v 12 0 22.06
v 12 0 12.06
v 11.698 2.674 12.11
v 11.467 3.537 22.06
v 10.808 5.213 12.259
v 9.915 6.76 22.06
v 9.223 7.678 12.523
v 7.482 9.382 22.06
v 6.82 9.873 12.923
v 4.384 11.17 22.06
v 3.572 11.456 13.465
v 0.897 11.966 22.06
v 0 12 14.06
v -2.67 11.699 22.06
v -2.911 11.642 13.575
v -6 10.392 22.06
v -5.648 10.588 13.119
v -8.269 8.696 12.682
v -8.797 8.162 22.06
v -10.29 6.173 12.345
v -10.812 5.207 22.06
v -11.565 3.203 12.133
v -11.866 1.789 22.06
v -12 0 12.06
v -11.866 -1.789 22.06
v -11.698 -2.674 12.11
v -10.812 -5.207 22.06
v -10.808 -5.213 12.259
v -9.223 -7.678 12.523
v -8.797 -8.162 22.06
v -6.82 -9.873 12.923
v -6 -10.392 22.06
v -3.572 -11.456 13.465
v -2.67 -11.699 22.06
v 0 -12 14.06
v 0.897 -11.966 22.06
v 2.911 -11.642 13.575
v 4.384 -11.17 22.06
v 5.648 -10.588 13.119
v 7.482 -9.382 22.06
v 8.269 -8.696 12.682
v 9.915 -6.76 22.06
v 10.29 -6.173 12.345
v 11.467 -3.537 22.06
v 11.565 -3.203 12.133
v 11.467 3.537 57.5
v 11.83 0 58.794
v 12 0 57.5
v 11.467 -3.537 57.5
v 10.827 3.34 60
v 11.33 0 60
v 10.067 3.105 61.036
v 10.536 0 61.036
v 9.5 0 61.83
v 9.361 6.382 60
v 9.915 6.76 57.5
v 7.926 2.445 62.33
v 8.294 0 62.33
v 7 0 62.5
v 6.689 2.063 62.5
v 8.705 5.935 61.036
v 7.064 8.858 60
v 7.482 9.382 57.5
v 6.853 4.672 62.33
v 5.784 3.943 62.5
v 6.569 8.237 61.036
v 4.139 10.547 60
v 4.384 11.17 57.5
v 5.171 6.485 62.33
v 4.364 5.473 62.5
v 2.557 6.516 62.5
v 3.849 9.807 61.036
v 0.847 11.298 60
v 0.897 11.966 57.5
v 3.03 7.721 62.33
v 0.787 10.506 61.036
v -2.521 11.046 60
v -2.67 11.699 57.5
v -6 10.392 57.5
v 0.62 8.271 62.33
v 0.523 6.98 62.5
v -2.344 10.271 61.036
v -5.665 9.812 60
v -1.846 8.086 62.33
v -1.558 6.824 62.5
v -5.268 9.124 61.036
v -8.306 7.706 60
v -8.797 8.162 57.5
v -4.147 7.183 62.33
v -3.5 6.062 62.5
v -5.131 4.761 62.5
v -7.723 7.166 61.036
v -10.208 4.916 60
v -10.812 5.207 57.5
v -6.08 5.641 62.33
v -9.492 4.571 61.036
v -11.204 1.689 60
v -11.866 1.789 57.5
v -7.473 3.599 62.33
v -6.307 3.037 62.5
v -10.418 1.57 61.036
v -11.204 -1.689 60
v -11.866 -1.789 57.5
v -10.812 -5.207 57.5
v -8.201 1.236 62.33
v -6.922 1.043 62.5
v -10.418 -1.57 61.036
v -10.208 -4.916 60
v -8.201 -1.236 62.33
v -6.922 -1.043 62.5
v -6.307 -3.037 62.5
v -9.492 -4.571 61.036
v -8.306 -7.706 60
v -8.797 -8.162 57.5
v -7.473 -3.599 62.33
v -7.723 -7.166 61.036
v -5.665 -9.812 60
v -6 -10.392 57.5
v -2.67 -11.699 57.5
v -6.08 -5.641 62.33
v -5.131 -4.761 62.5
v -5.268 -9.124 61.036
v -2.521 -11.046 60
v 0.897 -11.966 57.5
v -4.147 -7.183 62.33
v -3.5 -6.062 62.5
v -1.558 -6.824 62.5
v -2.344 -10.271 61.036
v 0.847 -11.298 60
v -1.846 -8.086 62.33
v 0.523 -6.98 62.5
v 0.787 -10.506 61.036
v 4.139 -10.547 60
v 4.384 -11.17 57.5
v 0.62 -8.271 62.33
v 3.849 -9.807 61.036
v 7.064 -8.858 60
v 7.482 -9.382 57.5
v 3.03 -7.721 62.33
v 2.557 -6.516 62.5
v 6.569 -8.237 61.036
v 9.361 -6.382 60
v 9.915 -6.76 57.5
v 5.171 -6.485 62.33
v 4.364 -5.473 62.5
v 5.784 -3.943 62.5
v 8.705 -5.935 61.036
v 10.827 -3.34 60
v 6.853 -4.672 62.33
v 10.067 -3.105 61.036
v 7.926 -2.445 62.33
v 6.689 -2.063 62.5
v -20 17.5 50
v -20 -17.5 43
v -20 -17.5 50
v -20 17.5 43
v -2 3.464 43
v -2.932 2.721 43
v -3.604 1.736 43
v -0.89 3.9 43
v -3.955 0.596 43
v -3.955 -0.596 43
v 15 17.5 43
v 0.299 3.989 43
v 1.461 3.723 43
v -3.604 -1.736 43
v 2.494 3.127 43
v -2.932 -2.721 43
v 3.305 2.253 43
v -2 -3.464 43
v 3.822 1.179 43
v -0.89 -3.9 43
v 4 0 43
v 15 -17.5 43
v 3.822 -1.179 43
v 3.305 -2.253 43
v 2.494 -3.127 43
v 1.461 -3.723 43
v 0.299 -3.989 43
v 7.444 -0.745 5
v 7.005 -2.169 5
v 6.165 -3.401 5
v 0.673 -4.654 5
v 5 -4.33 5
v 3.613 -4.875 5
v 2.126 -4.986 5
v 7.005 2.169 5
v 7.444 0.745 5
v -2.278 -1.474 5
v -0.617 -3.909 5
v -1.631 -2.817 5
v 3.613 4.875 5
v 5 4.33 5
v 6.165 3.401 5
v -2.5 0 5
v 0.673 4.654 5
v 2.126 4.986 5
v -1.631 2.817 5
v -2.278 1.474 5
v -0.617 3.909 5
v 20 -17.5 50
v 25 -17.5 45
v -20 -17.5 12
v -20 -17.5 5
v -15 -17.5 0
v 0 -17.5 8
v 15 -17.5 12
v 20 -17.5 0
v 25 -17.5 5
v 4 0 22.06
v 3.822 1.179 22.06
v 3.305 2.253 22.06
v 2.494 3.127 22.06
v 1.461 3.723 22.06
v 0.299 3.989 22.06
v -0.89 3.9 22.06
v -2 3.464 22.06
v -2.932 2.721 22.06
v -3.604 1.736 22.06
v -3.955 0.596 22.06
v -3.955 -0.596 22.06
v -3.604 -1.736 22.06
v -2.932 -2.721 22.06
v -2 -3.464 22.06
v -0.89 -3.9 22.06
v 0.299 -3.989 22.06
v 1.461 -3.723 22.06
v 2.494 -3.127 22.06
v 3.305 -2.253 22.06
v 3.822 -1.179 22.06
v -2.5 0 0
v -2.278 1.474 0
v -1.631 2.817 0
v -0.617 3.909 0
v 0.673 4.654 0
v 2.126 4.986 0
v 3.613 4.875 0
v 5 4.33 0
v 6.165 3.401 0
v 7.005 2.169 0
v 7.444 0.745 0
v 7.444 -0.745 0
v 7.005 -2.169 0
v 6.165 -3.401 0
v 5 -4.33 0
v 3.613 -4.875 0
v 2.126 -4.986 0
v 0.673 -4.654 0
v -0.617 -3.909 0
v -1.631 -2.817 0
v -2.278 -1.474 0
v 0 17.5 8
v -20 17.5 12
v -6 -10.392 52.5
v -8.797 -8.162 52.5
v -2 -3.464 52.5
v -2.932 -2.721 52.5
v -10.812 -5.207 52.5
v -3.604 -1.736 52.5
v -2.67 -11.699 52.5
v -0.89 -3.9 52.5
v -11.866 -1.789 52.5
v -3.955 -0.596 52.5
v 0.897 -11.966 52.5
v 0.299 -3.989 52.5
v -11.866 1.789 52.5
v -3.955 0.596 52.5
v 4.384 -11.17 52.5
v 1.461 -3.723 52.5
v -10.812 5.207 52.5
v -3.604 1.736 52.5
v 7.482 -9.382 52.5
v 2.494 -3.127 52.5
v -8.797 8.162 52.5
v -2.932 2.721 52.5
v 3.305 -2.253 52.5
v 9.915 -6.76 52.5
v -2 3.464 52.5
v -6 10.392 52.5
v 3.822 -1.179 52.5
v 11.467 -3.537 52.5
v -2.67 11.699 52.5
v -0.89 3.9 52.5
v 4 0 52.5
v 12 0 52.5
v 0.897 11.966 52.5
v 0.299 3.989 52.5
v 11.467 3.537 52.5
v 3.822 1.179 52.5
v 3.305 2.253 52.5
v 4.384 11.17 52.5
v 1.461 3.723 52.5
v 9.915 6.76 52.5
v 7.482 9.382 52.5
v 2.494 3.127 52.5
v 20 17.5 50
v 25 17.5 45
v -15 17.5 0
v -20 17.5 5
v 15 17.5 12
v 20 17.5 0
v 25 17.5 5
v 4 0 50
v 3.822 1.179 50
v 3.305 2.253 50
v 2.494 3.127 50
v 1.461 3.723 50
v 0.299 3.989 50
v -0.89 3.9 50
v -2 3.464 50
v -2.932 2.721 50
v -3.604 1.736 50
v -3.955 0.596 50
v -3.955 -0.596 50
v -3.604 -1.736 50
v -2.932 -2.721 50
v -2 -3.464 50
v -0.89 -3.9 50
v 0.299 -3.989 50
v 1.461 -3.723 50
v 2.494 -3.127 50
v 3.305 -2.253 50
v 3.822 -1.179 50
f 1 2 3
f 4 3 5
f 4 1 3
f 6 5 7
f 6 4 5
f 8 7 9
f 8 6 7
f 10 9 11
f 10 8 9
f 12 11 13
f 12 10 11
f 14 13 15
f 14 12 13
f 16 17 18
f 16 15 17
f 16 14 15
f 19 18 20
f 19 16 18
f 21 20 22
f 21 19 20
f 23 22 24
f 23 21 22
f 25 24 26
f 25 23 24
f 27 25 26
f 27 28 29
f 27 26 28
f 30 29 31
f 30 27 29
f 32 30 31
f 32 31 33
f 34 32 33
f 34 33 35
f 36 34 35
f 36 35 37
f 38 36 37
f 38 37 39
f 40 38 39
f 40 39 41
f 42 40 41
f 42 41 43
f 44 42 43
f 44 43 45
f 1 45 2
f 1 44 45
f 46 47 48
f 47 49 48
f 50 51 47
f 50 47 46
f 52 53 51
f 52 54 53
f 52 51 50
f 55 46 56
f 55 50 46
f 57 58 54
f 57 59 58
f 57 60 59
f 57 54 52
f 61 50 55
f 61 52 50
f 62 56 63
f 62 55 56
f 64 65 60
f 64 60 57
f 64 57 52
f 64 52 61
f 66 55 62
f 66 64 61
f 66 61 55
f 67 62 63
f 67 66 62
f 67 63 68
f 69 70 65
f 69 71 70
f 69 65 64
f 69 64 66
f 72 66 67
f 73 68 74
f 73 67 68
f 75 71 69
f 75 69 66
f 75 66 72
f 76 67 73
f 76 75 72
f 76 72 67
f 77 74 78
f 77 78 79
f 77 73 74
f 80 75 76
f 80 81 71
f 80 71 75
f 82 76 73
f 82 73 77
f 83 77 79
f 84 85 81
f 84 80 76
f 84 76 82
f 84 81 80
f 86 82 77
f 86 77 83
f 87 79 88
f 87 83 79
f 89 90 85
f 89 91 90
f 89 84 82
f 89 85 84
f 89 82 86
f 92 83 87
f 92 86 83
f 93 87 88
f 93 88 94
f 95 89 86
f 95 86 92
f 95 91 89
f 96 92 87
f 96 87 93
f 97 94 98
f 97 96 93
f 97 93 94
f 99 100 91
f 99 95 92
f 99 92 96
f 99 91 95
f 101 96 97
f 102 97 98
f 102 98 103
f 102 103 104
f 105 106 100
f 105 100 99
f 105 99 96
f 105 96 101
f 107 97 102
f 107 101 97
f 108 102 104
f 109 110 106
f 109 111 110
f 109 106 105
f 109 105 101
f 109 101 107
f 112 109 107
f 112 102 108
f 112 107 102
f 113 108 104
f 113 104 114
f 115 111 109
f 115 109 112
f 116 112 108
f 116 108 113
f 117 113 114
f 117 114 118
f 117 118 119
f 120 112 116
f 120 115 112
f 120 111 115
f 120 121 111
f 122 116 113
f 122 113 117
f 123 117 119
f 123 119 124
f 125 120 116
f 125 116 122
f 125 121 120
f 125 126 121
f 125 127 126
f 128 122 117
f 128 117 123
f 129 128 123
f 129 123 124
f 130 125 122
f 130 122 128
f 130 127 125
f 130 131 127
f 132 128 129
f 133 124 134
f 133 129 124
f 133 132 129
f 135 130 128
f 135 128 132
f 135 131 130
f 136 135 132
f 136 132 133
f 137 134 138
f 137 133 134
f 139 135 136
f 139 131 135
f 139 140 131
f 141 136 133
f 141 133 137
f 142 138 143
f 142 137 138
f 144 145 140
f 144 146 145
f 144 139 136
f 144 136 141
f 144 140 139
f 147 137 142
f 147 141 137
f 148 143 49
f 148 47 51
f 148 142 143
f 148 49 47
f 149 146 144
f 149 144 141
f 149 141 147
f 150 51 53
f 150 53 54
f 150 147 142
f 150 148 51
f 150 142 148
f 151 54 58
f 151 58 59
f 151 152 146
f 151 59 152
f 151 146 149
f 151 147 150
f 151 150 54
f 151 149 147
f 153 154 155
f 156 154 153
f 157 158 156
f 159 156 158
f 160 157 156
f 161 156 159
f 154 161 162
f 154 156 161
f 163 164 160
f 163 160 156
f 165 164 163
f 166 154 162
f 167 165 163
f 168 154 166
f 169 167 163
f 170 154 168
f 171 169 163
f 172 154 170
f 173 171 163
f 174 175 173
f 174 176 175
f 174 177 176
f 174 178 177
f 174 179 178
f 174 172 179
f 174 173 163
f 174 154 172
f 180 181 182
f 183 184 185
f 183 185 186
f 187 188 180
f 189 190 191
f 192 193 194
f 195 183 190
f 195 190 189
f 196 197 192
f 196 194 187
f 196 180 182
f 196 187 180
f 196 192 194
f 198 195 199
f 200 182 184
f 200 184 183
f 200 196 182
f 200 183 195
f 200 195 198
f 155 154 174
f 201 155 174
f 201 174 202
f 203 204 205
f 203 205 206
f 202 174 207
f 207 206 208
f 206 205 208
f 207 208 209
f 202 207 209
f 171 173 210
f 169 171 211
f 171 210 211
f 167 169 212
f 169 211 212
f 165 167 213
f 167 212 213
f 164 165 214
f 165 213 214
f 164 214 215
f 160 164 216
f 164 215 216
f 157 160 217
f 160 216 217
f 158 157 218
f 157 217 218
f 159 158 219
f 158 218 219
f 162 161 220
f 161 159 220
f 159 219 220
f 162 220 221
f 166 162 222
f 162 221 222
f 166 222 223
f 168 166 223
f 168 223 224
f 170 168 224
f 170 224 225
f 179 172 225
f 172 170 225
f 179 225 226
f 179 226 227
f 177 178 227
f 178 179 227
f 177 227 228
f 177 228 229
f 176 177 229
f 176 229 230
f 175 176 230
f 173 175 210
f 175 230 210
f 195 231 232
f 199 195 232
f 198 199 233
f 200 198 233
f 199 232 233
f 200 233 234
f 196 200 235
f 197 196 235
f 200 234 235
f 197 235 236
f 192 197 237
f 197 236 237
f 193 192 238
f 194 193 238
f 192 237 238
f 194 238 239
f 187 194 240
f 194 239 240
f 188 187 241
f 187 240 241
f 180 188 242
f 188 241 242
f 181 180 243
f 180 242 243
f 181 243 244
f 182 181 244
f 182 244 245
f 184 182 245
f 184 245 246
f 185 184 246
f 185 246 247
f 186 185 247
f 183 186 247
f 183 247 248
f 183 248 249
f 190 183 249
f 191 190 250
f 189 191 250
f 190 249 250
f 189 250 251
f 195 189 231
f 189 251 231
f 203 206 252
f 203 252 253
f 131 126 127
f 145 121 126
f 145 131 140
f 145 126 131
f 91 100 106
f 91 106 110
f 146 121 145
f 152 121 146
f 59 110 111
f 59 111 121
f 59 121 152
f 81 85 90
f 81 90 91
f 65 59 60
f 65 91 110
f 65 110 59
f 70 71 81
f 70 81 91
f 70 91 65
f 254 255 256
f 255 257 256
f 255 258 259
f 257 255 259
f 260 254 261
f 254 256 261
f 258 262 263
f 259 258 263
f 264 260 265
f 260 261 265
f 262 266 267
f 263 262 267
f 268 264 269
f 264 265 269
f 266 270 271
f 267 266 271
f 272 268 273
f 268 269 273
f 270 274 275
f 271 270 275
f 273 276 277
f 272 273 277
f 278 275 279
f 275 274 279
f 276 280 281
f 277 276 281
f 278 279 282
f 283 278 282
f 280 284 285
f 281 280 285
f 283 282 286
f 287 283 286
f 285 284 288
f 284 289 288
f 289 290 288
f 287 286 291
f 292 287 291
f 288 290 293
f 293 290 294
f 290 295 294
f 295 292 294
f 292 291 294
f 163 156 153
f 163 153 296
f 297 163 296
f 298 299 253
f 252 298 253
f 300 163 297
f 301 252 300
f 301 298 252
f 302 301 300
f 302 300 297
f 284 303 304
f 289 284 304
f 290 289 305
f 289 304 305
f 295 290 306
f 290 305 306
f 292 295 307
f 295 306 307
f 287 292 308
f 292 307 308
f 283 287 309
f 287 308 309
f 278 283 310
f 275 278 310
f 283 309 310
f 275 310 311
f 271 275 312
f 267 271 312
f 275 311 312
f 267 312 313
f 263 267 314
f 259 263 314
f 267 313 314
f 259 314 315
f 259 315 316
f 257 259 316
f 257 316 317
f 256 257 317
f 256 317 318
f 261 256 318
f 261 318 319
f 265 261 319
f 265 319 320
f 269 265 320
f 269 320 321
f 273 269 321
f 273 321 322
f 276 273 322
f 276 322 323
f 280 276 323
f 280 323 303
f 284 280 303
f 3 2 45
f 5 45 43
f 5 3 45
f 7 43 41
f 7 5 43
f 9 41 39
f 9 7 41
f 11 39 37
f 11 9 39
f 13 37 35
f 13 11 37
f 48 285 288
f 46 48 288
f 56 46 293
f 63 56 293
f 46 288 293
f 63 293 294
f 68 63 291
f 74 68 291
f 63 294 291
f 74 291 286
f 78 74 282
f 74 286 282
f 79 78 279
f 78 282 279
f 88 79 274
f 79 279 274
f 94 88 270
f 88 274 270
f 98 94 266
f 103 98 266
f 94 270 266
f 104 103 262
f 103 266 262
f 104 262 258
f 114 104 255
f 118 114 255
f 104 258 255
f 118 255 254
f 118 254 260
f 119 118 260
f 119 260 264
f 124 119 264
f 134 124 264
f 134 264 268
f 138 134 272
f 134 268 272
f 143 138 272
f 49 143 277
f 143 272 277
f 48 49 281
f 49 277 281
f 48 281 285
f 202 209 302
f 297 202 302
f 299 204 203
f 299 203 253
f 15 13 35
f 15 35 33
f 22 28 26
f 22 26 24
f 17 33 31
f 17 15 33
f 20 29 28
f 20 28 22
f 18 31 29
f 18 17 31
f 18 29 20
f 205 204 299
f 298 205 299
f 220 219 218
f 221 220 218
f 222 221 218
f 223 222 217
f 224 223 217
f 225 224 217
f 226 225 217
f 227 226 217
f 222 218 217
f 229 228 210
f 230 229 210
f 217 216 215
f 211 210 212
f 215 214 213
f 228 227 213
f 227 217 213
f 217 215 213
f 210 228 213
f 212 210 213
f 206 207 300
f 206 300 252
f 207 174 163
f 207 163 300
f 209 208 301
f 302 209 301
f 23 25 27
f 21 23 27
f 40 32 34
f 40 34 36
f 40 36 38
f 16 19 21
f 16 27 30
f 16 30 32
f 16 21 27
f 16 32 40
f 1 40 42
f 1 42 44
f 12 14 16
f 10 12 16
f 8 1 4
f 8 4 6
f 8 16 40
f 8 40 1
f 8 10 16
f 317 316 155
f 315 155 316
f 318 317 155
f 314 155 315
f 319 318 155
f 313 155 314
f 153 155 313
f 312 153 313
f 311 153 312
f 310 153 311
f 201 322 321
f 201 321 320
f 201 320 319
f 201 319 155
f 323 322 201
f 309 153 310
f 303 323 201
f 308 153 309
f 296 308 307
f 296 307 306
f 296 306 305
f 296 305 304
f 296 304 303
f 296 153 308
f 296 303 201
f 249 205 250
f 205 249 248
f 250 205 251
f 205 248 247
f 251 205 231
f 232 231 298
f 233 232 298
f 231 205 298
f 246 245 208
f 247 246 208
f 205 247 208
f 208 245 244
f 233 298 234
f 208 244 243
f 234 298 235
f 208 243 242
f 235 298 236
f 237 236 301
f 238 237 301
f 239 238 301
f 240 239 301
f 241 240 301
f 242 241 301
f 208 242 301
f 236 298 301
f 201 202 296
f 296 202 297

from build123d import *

# Parameters (mm, degrees)
SKETCH1_W                = 45
SKETCH1_H                = 35
BOSS_EXTRUDE1_DEPTH      = 50
CUT_EXTRUDE1_DEPTH       = 35
BOSS_EXTRUDE2_DEPTH      = 2.5
BOSS_EXTRUDE2_DEPTH_BACK = 27.94
SKETCH3_R                = 4
BOSS_EXTRUDE3_START      = 2.5
SKETCH3_3_R              = 12
BOSS_EXTRUDE3_DEPTH      = 10
BOSS_EXTRUDE6_START      = -27.94
SKETCH3_4_R              = 12
BOSS_EXTRUDE6_DEPTH      = 10
FILLET1_R                = 5
CUT_EXTRUDE2_START       = -29.5000001
CUT_EXTRUDE2_DEPTH       = 24.0000001
CHAMFER1_SIZE            = 5
SKETCH5_R                = 5
CUT_EXTRUDE3_DEPTH       = 5


# Read off the part's stored shape, not the designer's step: Cut-Extrude2
with BuildPart() as part:
    # Sketch1 → Boss-Extrude1 (new body)
    with BuildSketch(Plane.XY):
        with Locations((2.5, 0)):
            Rectangle(SKETCH1_W, SKETCH1_H)
    extrude(amount=BOSS_EXTRUDE1_DEPTH)

    # Sketch2 → Cut-Extrude1 (cut)
    with BuildSketch(Plane.XZ.offset(17.5)):
        Polygon((-20, 43), (15, 43), (15, 12), (0, 8), (-20, 12), align=None)
    extrude(amount=-CUT_EXTRUDE1_DEPTH, mode=Mode.SUBTRACT)

    # Sketch3 → Boss-Extrude2 (add, two sides: drawn at the far end of the back side and taken through both)
    with BuildSketch(Plane.XY.offset(50).offset(-BOSS_EXTRUDE2_DEPTH_BACK)):
        Circle(SKETCH3_R)
    extrude(amount=BOSS_EXTRUDE2_DEPTH + BOSS_EXTRUDE2_DEPTH_BACK)

    # Sketch3<3> → Boss-Extrude3 (add)
    with BuildSketch(Plane.XY.offset(50).offset(BOSS_EXTRUDE3_START)):
        Circle(SKETCH3_3_R)
    extrude(amount=BOSS_EXTRUDE3_DEPTH)

    # Fillet1
    fillet1_edges = [part.edges().sort_by_distance(p)[0] for p in [
        (-12, 0, 62.5),
    ]]
    fillet(fillet1_edges, radius=FILLET1_R)

    # Chamfer1
    chamfer1_edges = [part.edges().sort_by_distance(p)[0] for p in [
        (25, 0, 50),
        (25, 0, 0),
        (-20, 0, 0),
    ]]
    chamfer(chamfer1_edges, length=CHAMFER1_SIZE)

    # Sketch5 → Cut-Extrude3 (cut)
    with BuildSketch(Plane(origin=(0, 0, 0), x_dir=(-1, 0, 0), z_dir=(0, 0, -1))):
        with Locations((-2.5, 0)):
            Circle(SKETCH5_R)
    extrude(amount=-CUT_EXTRUDE3_DEPTH, mode=Mode.SUBTRACT)


with BuildPart() as body_2:
    # Sketch3<4> → Boss-Extrude6 (new body)
    with BuildSketch(Plane.XY.offset(50).offset(BOSS_EXTRUDE6_START)):
        Circle(SKETCH3_4_R)
    extrude(amount=-BOSS_EXTRUDE6_DEPTH)

    # Cut-Extrude2 outline → Cut-Extrude2 (cut)
    with BuildSketch(Plane.XZ.offset(17.5).offset(CUT_EXTRUDE2_START)):
        Polygon((12, 12.06), (0, 14.06), (-12, 12.06), align=None)
    extrude(amount=CUT_EXTRUDE2_DEPTH, mode=Mode.SUBTRACT)


solid = Compound([part.part, body_2.part])
